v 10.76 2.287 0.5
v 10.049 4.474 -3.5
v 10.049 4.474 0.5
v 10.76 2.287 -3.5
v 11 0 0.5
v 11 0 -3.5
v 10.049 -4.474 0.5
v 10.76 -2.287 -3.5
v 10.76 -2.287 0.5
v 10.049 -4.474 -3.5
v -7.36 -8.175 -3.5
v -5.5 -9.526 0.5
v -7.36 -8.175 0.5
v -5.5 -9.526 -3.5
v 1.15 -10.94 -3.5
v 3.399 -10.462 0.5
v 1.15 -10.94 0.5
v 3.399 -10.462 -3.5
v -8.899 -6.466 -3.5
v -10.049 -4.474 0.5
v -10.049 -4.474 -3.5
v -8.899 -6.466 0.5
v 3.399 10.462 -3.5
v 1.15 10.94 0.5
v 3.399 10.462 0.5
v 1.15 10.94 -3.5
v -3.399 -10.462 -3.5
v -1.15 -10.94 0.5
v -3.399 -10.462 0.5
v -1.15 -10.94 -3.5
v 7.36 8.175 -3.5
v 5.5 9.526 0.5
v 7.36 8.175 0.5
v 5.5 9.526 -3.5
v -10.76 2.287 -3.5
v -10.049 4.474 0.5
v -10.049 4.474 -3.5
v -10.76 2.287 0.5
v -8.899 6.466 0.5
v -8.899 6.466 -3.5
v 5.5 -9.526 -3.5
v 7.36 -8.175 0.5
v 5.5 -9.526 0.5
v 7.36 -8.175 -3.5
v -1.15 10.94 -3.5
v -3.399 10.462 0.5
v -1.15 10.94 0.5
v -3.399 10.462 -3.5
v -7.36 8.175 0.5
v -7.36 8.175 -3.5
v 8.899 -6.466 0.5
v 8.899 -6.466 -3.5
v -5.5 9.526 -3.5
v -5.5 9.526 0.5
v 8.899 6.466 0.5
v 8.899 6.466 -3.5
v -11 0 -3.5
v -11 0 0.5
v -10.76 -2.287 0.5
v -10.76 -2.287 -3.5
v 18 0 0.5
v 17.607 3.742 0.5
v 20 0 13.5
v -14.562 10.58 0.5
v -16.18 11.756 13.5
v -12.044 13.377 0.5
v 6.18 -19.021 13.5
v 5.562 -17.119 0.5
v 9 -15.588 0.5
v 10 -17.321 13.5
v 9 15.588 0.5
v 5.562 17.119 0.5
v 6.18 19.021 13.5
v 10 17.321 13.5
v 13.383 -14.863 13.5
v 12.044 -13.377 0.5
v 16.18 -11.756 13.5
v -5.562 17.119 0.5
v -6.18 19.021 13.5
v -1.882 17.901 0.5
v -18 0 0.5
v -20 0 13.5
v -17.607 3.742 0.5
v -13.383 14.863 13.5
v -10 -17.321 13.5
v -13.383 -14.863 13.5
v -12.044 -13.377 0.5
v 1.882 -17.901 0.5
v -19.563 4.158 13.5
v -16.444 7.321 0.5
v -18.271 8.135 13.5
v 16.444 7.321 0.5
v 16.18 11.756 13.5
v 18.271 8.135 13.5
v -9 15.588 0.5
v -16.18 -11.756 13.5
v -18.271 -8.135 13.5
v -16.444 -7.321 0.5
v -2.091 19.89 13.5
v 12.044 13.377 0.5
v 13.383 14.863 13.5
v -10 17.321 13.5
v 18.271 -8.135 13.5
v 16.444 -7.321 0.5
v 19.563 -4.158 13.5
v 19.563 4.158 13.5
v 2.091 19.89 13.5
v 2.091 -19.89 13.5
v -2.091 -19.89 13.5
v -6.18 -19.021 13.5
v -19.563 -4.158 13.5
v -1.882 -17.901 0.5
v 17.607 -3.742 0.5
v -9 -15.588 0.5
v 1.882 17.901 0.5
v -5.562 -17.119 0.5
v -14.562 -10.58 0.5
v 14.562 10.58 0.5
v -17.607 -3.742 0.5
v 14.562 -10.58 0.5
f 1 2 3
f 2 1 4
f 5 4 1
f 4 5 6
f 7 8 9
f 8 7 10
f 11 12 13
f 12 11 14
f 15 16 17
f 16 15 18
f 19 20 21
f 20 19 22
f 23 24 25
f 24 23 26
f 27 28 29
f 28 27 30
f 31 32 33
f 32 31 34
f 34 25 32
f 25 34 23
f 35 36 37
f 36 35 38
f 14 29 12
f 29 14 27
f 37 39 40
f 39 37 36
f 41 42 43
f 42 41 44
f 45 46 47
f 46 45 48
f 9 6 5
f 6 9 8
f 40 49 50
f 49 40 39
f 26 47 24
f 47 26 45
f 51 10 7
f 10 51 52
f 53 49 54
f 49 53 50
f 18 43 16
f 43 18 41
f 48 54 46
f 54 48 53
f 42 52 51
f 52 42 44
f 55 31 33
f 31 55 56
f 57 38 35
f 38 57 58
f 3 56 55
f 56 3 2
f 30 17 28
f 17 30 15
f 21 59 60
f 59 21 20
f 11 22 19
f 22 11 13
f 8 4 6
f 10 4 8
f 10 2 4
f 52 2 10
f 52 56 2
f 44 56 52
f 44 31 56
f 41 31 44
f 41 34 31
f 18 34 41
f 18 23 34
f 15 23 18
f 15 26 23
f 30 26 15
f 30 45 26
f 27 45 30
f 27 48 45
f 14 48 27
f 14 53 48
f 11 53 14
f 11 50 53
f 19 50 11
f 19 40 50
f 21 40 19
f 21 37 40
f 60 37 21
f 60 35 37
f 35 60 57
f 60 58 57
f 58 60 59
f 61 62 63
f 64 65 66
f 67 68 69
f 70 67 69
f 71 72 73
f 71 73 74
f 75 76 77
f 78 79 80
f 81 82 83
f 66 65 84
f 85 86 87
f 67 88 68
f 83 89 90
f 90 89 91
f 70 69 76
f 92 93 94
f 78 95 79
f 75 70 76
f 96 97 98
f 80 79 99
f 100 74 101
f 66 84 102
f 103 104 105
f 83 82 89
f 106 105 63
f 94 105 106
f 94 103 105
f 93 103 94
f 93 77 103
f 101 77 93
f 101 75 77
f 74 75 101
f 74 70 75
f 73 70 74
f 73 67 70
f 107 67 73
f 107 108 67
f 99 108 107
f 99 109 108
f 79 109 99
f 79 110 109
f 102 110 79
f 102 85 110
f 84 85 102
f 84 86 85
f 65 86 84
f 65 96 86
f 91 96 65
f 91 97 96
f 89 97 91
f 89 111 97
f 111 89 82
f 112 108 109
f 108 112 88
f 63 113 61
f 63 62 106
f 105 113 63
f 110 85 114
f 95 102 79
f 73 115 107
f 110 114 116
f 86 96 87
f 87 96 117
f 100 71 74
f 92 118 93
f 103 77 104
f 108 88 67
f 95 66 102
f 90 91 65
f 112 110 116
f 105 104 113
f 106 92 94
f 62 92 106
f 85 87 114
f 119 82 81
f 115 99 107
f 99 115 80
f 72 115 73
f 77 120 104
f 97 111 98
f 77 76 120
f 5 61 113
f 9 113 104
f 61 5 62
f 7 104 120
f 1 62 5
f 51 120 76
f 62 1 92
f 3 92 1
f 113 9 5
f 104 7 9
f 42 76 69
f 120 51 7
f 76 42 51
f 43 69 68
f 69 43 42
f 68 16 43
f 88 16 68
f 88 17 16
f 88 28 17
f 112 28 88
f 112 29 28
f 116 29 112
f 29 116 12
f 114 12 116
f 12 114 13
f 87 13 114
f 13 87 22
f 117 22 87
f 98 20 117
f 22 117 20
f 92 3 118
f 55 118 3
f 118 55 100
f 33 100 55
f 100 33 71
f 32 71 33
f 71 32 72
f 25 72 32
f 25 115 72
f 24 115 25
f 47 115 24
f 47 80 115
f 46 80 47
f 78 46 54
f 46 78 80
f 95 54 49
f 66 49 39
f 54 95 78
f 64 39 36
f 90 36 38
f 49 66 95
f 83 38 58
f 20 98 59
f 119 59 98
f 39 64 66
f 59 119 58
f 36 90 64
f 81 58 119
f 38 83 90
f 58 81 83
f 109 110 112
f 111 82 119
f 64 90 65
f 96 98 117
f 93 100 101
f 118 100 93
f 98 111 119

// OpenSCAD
module speaker() {
    cylinder(r=11, h=7, center=true);
    translate([0,0,7]) cylinder(r1=18, r2=20, h=13, center=true);
}

speaker();
